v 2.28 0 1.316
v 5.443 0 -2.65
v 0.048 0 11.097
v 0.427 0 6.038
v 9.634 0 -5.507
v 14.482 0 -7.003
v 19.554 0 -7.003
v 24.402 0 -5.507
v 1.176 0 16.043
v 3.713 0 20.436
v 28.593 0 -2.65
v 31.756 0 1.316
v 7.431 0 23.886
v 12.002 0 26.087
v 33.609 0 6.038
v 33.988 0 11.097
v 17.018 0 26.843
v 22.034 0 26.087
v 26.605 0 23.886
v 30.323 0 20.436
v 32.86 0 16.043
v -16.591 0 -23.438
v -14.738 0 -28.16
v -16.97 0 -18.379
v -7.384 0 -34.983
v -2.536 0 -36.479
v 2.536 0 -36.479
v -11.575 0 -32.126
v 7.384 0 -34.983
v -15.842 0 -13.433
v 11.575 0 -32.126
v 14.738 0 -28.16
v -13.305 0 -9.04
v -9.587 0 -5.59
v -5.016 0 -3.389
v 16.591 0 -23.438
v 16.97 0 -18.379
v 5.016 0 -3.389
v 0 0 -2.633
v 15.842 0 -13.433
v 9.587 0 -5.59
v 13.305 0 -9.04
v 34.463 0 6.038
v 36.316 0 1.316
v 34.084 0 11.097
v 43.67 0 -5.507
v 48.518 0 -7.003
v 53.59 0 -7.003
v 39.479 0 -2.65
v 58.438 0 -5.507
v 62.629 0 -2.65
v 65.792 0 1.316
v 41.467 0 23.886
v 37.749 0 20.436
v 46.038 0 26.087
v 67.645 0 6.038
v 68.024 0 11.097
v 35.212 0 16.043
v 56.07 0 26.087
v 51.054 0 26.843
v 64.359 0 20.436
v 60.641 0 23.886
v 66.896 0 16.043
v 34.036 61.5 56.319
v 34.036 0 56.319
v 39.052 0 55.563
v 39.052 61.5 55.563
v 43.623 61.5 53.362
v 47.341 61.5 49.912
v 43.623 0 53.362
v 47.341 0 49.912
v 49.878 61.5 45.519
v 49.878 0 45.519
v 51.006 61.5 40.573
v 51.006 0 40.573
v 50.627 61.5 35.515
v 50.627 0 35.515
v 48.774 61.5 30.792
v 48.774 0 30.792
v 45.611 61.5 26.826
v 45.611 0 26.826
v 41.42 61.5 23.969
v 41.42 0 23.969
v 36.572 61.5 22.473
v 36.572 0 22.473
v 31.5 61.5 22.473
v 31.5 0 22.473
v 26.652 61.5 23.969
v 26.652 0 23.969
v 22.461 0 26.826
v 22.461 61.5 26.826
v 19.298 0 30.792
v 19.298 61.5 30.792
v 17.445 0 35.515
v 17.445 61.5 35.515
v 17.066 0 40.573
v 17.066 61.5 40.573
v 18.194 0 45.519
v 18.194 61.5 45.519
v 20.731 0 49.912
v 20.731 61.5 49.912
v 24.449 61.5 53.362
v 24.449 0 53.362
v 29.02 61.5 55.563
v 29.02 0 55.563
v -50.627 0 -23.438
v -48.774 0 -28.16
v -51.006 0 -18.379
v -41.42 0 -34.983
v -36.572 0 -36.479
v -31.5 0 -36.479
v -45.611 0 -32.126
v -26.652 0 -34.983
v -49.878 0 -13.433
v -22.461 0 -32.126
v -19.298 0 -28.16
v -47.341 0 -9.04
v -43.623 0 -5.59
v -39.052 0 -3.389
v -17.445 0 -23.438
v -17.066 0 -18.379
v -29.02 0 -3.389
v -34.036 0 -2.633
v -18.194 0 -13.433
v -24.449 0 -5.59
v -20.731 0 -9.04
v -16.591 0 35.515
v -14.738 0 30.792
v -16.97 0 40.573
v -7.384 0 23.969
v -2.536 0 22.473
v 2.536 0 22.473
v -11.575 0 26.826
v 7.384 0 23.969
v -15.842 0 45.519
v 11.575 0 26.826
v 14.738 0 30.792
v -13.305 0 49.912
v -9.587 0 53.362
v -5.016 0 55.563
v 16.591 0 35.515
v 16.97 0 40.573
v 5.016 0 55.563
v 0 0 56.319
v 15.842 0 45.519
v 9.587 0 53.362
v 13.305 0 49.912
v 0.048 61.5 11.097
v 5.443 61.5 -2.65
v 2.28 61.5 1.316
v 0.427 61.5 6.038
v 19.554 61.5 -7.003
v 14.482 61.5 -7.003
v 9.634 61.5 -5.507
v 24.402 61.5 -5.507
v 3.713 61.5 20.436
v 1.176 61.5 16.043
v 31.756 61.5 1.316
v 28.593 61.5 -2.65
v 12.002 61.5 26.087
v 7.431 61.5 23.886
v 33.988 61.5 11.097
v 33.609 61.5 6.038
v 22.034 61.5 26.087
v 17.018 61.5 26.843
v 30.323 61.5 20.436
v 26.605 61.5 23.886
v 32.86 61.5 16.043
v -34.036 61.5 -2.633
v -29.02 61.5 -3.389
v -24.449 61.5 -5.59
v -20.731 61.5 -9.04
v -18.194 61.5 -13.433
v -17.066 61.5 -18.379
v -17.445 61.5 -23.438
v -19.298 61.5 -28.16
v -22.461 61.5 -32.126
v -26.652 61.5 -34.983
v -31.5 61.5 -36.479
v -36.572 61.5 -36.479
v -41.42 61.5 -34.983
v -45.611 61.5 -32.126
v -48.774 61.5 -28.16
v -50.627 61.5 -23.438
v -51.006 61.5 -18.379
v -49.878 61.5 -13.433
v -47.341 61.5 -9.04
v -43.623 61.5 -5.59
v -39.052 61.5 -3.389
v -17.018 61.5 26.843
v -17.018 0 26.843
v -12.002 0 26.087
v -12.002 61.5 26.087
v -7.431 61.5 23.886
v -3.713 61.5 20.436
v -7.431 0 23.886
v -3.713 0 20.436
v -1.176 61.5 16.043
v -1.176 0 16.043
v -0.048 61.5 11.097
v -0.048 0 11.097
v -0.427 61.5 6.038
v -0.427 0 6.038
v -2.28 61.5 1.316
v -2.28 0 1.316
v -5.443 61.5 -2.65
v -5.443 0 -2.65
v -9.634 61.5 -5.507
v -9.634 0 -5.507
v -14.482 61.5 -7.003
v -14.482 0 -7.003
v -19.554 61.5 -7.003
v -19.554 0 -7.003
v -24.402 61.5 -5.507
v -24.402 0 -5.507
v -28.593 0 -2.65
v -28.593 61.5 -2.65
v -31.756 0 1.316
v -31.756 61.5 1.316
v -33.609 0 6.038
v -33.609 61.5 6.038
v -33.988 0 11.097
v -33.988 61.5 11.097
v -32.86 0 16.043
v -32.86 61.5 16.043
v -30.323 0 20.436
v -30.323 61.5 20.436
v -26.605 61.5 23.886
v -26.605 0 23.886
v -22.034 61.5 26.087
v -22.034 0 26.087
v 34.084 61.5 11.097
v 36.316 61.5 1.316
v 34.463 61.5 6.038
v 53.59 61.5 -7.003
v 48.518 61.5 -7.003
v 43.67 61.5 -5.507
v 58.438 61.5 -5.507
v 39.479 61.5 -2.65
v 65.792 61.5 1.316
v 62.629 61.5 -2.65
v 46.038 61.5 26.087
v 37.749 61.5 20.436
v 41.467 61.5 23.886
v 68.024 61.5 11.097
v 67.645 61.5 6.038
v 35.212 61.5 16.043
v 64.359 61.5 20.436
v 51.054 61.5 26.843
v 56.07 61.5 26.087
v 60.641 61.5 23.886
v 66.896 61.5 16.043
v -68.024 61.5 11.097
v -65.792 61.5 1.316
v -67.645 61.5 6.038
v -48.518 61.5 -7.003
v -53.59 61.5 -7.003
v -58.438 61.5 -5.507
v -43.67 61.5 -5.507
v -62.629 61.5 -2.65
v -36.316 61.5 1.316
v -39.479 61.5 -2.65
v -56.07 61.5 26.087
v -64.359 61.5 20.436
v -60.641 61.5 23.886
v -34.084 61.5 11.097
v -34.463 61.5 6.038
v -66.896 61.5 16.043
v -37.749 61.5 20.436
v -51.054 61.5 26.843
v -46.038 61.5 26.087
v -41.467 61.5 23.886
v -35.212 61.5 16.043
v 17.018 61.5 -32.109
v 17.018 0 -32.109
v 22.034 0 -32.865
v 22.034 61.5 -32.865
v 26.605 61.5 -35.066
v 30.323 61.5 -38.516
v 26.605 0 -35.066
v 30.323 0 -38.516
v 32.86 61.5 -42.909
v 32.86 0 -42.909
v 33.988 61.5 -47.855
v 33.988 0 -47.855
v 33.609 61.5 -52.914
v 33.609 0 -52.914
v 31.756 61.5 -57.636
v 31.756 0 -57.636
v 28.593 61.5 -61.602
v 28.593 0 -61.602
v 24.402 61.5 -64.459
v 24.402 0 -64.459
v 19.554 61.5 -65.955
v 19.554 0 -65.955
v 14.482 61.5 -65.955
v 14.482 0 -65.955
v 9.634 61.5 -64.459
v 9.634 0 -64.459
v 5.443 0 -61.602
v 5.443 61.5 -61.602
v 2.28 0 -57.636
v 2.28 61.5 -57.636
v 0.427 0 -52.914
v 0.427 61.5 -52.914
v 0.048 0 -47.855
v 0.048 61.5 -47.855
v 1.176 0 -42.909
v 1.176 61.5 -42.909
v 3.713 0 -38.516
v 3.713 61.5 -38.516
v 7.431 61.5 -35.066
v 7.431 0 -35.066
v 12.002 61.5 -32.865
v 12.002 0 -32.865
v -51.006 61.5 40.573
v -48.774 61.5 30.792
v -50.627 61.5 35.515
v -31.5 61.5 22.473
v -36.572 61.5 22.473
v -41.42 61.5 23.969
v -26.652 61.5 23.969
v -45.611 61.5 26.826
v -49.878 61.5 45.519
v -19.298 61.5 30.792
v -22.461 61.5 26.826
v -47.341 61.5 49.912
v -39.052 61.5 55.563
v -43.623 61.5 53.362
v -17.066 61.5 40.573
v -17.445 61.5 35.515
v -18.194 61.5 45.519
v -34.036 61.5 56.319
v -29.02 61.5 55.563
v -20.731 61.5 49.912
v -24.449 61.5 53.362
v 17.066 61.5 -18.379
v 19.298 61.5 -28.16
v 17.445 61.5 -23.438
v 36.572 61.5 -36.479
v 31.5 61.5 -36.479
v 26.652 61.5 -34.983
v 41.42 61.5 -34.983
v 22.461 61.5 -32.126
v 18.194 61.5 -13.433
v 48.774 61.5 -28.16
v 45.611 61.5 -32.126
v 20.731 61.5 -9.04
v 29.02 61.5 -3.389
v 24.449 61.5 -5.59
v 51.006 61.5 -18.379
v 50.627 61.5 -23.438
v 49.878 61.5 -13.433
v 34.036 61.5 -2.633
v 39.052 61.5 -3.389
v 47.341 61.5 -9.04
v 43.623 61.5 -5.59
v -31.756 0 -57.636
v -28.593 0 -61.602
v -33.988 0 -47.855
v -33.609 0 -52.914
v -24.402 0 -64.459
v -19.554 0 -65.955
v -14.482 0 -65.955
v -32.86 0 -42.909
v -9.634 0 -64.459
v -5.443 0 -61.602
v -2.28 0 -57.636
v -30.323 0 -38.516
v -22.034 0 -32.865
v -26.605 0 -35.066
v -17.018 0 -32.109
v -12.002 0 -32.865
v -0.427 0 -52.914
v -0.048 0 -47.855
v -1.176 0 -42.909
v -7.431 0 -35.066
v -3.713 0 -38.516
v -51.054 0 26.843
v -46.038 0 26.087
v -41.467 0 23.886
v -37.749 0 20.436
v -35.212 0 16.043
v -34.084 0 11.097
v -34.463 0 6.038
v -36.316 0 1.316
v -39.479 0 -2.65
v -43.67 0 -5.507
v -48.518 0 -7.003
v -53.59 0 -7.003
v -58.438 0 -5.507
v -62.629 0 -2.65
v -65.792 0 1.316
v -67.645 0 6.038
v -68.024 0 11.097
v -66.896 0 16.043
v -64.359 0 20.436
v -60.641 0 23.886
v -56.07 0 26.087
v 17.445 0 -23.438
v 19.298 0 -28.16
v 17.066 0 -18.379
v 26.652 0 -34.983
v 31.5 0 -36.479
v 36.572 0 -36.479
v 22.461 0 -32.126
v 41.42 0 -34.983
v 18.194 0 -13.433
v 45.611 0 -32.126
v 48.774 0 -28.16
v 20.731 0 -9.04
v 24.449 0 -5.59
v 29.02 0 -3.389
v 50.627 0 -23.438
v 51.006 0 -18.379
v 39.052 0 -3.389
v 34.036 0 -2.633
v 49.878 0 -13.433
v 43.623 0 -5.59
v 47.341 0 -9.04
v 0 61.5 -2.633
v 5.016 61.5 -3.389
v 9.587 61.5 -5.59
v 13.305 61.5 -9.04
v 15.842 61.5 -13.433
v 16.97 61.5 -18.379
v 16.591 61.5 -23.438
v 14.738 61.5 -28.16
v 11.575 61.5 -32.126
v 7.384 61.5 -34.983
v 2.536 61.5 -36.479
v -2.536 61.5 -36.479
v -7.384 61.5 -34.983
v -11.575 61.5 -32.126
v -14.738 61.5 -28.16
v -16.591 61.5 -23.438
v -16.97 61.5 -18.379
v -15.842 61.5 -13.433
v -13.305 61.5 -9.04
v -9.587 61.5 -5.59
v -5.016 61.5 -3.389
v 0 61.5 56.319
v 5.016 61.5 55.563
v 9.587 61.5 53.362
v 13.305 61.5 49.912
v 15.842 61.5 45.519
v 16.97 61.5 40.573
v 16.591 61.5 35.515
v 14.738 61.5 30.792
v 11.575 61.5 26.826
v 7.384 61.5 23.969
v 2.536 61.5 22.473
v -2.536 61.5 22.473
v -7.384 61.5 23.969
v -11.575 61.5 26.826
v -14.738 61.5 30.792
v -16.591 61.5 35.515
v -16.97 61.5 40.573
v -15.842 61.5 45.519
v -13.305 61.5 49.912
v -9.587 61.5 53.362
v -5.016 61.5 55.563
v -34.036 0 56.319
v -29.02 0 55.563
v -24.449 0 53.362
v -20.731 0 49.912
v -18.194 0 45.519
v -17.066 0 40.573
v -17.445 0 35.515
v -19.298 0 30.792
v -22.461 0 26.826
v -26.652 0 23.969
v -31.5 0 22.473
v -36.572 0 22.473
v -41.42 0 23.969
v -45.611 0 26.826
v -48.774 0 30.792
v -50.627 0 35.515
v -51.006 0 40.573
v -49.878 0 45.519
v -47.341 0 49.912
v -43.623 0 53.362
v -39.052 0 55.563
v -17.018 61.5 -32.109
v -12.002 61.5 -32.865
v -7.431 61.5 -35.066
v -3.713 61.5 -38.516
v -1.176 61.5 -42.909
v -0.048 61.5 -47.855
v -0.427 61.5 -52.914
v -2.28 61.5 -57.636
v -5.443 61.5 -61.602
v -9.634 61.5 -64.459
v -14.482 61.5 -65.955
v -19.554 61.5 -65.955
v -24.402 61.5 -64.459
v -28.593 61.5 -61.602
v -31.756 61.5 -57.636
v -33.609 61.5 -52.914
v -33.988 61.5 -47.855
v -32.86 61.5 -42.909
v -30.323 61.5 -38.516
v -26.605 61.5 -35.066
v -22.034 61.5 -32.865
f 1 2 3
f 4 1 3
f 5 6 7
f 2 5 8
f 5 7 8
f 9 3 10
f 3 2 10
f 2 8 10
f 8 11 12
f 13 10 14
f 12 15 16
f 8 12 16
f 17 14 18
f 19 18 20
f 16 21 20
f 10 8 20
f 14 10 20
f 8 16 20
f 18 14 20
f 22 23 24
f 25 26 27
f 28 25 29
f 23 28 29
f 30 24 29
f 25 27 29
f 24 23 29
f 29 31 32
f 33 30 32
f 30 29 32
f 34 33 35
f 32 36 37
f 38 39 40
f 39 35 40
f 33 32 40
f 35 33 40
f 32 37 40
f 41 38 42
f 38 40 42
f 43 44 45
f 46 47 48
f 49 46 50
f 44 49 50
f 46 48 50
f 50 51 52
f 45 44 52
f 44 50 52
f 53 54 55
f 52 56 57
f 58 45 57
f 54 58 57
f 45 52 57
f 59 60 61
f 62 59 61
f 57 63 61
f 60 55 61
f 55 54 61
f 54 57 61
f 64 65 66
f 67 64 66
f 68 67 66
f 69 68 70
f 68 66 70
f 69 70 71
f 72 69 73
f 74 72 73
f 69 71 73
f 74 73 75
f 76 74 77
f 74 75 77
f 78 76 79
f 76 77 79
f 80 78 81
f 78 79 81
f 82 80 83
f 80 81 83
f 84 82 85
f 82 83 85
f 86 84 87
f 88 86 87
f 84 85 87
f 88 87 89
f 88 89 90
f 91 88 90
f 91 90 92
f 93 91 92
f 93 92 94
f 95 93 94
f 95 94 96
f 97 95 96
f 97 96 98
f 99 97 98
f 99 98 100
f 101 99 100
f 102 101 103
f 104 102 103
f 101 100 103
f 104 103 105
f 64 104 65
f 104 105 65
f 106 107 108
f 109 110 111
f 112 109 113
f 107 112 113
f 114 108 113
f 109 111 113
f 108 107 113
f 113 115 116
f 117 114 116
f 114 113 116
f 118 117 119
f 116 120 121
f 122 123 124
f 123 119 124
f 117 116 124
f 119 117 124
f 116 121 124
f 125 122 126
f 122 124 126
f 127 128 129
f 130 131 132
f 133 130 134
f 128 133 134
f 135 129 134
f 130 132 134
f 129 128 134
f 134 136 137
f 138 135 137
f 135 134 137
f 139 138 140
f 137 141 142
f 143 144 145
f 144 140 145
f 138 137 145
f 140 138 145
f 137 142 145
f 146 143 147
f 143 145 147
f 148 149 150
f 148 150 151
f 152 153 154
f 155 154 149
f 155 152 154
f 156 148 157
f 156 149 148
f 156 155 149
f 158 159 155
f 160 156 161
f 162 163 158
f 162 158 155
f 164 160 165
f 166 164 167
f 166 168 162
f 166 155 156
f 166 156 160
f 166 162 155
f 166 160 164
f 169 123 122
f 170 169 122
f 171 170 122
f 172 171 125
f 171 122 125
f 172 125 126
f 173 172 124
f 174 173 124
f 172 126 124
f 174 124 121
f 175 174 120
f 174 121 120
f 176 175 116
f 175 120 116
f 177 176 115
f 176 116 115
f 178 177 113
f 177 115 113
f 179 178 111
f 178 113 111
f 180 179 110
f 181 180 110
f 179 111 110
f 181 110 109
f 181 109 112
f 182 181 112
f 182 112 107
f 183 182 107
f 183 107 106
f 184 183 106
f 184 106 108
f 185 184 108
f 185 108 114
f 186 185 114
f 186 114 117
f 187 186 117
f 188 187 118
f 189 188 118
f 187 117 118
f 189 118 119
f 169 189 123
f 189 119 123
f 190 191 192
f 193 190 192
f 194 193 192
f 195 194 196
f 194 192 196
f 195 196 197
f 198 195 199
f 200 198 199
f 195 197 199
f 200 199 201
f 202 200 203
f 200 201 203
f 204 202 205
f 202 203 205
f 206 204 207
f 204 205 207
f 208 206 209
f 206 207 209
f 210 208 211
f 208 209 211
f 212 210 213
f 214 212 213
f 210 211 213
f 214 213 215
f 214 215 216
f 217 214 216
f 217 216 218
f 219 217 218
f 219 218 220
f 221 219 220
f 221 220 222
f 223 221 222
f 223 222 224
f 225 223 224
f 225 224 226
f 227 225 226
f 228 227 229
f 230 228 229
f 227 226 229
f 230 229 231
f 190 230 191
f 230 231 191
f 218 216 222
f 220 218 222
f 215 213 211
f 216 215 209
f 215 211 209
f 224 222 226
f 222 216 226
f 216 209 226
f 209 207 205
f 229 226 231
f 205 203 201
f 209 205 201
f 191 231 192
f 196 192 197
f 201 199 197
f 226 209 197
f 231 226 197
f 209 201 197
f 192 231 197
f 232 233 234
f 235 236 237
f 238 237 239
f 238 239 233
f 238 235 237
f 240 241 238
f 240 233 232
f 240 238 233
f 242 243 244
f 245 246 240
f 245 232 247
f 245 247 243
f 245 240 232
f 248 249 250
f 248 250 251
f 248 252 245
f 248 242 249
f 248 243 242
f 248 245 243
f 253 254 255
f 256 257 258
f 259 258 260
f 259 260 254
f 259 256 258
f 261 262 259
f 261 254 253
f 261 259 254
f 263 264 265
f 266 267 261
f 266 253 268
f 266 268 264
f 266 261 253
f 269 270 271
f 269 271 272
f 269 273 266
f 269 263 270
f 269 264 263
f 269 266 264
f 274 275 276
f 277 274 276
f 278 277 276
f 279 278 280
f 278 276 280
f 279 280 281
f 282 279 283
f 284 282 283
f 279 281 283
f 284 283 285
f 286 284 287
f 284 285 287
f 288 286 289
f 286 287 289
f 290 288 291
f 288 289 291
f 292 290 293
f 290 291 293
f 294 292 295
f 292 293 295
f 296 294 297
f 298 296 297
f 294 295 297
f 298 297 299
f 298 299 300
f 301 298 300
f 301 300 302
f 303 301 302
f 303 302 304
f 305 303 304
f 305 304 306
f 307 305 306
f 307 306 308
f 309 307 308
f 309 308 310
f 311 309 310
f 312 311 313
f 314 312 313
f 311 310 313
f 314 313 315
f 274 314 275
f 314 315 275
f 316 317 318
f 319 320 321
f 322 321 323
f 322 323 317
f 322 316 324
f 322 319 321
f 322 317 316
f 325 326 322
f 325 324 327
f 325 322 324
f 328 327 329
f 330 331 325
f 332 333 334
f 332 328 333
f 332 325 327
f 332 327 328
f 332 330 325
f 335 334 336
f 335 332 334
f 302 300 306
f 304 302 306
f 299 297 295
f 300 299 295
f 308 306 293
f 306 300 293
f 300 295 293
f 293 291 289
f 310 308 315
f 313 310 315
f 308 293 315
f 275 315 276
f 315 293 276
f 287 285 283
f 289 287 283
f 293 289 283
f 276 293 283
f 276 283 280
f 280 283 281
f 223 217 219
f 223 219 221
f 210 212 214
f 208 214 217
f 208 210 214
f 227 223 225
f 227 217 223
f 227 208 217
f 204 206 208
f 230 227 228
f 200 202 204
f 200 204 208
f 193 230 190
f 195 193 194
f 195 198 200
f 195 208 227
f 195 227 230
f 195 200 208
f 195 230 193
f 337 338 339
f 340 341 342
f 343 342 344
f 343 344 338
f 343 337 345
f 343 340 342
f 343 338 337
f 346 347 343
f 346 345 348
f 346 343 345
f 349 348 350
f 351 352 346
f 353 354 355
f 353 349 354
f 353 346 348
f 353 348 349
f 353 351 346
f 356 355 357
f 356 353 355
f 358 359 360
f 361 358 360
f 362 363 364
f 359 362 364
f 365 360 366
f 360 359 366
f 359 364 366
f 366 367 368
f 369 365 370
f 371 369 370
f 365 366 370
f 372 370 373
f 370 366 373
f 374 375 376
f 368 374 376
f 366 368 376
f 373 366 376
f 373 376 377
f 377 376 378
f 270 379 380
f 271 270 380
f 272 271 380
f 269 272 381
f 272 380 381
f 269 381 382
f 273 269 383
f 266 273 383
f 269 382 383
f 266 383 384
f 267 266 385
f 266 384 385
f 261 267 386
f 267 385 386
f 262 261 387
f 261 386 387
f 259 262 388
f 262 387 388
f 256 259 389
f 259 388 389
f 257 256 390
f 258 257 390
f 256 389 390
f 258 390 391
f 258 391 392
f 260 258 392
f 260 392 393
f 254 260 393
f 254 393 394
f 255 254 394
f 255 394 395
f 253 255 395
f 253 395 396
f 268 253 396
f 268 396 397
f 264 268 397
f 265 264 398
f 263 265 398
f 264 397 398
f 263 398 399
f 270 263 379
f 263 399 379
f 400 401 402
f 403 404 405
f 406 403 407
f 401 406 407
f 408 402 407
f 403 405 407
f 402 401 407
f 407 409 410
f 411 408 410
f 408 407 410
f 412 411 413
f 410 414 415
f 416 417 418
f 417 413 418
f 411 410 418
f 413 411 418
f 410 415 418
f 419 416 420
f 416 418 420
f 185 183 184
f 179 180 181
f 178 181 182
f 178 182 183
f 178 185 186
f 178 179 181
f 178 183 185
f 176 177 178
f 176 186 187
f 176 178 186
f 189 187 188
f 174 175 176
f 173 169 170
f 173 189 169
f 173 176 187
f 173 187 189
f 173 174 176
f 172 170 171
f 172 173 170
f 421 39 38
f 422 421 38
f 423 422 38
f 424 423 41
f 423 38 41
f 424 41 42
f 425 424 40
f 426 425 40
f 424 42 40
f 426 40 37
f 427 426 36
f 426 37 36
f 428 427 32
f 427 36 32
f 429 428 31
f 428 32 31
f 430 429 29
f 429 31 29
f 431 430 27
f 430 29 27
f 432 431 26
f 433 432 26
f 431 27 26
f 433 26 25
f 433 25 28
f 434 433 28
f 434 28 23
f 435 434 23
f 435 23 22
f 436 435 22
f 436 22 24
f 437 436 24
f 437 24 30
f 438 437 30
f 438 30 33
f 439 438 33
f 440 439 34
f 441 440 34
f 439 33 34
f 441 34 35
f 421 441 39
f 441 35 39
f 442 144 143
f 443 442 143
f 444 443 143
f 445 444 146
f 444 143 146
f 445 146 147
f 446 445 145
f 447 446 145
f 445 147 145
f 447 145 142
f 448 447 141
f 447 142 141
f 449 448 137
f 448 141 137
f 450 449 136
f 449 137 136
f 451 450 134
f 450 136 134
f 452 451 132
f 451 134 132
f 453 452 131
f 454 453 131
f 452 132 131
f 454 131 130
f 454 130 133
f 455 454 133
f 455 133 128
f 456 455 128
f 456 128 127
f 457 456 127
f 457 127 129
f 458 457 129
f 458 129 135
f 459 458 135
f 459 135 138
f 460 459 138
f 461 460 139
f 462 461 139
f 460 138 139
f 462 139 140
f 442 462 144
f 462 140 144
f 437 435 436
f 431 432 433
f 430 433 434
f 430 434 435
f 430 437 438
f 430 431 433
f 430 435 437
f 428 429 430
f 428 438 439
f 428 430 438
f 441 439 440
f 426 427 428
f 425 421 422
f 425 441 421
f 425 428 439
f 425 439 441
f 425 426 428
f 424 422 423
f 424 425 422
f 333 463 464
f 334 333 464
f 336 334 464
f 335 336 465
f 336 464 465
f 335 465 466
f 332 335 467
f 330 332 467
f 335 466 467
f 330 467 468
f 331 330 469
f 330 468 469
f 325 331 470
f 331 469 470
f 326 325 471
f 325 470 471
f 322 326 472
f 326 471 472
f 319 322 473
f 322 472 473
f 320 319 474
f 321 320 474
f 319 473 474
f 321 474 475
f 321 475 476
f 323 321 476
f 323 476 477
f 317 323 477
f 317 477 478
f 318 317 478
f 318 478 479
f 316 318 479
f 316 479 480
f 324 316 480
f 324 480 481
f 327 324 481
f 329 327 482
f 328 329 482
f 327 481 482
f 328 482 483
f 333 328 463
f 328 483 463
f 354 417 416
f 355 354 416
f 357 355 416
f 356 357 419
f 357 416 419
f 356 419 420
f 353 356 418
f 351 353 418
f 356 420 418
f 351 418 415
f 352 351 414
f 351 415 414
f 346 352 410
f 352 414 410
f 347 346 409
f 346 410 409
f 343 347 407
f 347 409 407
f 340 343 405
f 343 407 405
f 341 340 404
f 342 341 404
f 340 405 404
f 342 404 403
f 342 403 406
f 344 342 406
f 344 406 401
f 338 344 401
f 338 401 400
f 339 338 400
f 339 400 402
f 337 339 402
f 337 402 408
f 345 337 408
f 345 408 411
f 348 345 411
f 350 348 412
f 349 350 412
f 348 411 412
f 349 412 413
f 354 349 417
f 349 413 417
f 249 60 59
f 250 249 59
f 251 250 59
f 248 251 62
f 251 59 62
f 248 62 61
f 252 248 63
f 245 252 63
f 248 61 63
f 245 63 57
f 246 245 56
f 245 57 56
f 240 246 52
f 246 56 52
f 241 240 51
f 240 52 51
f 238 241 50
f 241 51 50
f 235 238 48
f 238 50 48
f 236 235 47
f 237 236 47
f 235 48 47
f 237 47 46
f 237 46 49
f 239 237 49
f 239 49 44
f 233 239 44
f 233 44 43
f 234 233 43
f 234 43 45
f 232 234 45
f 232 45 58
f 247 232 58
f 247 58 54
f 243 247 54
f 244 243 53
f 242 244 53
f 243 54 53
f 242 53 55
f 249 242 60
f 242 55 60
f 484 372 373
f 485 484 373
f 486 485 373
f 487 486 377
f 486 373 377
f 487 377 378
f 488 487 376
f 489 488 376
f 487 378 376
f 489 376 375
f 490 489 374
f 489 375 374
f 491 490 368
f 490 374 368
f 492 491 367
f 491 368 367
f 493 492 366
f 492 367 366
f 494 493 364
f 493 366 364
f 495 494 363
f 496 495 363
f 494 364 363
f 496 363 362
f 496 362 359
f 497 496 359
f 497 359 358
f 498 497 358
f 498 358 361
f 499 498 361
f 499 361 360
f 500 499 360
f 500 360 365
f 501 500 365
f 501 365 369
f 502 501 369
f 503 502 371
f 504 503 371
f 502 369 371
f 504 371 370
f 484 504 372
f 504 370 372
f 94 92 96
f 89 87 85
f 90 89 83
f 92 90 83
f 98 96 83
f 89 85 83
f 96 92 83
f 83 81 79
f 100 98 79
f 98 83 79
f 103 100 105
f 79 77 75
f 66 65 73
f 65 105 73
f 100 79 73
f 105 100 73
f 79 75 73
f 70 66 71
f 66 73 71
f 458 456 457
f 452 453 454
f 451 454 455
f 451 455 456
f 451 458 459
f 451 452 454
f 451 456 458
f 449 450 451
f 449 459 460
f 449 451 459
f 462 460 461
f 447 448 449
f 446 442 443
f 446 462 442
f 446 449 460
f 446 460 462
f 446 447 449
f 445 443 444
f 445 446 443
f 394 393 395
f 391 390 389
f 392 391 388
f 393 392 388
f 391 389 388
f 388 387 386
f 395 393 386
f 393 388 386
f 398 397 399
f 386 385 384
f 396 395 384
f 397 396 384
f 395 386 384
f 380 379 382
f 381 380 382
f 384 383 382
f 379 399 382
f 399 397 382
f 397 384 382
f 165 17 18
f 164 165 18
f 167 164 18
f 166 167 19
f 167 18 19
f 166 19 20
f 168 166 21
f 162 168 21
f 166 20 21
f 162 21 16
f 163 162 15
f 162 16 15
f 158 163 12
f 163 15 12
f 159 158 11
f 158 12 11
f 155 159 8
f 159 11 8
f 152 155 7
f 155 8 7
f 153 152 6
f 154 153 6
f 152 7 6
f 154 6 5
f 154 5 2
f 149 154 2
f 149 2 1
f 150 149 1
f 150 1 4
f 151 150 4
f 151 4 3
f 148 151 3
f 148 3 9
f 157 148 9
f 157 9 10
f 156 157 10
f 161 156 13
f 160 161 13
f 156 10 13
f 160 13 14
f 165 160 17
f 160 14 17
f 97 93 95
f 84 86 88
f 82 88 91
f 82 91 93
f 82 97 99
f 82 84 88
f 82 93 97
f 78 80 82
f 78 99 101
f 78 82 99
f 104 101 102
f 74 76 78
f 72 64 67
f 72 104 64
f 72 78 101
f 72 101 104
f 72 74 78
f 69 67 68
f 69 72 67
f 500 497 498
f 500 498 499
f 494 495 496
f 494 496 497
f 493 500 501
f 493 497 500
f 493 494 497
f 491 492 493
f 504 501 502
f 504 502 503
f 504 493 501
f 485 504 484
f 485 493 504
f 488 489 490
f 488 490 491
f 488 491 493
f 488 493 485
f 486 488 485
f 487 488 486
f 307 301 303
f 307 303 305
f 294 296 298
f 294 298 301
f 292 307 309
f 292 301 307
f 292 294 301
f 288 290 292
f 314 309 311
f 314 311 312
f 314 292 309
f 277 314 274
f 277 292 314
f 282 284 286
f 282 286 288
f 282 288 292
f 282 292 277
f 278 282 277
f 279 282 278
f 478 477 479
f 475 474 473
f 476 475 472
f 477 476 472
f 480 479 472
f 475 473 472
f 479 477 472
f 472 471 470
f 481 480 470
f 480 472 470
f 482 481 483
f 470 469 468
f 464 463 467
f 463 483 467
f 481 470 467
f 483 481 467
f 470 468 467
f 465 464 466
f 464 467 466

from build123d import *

# Parameters (mm, degrees)
SKETCH1_R              = 17.018
BOSS_EXTRUDE1_DEPTH    = 61.5
BOSS_EXTRUDE1_2_DEPTH  = 61.5
BOSS_EXTRUDE1_3_DEPTH  = 61.5
BOSS_EXTRUDE1_4_DEPTH  = 61.5
BOSS_EXTRUDE1_5_DEPTH  = 61.5
BOSS_EXTRUDE1_6_DEPTH  = 61.5
BOSS_EXTRUDE1_7_DEPTH  = 61.5
BOSS_EXTRUDE1_8_DEPTH  = 61.5
BOSS_EXTRUDE1_9_DEPTH  = 61.5
BOSS_EXTRUDE1_10_DEPTH = 61.5
BOSS_EXTRUDE1_11_DEPTH = 61.5
BOSS_EXTRUDE1_12_DEPTH = 61.5


with BuildPart() as part:
    # Sketch1 → Boss-Extrude1 (new body)
    with BuildSketch(Plane(origin=(0, 0, 0), x_dir=(1, 0, 0), z_dir=(0, 1, 0))):
        with Locations(Location((34.036, -39.301387524, 0), (0, 0, 270))):
            Circle(SKETCH1_R)
    extrude(amount=BOSS_EXTRUDE1_DEPTH)


with BuildPart() as body_2:
    # Sketch1 → Boss-Extrude1 2 (new body)
    with BuildSketch(Plane(origin=(0, 0, 0), x_dir=(1, 0, 0), z_dir=(0, 1, 0))):
        with Locations(Location((51.054, -9.825346881, 0), (0, 0, 270))):
            Circle(SKETCH1_R)
    extrude(amount=BOSS_EXTRUDE1_2_DEPTH)


with BuildPart() as body_3:
    # Sketch1 → Boss-Extrude1 3 (new body)
    with BuildSketch(Plane(origin=(0, 0, 0), x_dir=(1, 0, 0), z_dir=(0, 1, 0))):
        with Locations(Location((34.036, 19.650693762, 0), (0, 0, 270))):
            Circle(SKETCH1_R)
    extrude(amount=BOSS_EXTRUDE1_3_DEPTH)


with BuildPart() as body_4:
    # Sketch1 → Boss-Extrude1 4 (new body)
    with BuildSketch(Plane(origin=(0, 0, 0), x_dir=(1, 0, 0), z_dir=(0, 1, 0))):
        with Locations(Location((17.018, 49.126734405, 0), (0, 0, 270))):
            Circle(SKETCH1_R)
    extrude(amount=BOSS_EXTRUDE1_4_DEPTH)


with BuildPart() as body_5:
    # Sketch1 → Boss-Extrude1 5 (new body)
    with BuildSketch(Plane(origin=(0, 0, 0), x_dir=(1, 0, 0), z_dir=(0, 1, 0))):
        with Locations(Location((-17.018, 49.126734405, 0), (0, 0, 270))):
            Circle(SKETCH1_R)
    extrude(amount=BOSS_EXTRUDE1_5_DEPTH)


with BuildPart() as body_6:
    # Sketch1 → Boss-Extrude1 6 (new body)
    with BuildSketch(Plane(origin=(0, 0, 0), x_dir=(1, 0, 0), z_dir=(0, 1, 0))):
        with Locations(Location((-34.036, 19.650693762, 0), (0, 0, 270))):
            Circle(SKETCH1_R)
    extrude(amount=BOSS_EXTRUDE1_6_DEPTH)


with BuildPart() as body_7:
    # Sketch1 → Boss-Extrude1 7 (new body)
    with BuildSketch(Plane(origin=(0, 0, 0), x_dir=(1, 0, 0), z_dir=(0, 1, 0))):
        with Locations(Location((0, 19.650693762, 0), (0, 0, 270))):
            Circle(SKETCH1_R)
    extrude(amount=BOSS_EXTRUDE1_7_DEPTH)


with BuildPart() as body_8:
    # Sketch1 → Boss-Extrude1 8 (new body)
    with BuildSketch(Plane(origin=(0, 0, 0), x_dir=(1, 0, 0), z_dir=(0, 1, 0))):
        with Locations(Location((-17.018, -9.825346881, 0), (0, 0, 270))):
            Circle(SKETCH1_R)
    extrude(amount=BOSS_EXTRUDE1_8_DEPTH)


with BuildPart() as body_9:
    # Sketch1 → Boss-Extrude1 9 (new body)
    with BuildSketch(Plane(origin=(0, 0, 0), x_dir=(1, 0, 0), z_dir=(0, 1, 0))):
        with Locations(Location((-51.054, -9.825346881, 0), (0, 0, 270))):
            Circle(SKETCH1_R)
    extrude(amount=BOSS_EXTRUDE1_9_DEPTH)


with BuildPart() as body_10:
    # Sketch1 → Boss-Extrude1 10 (new body)
    with BuildSketch(Plane(origin=(0, 0, 0), x_dir=(1, 0, 0), z_dir=(0, 1, 0))):
        with Locations(Location((-34.036, -39.301387524, 0), (0, 0, 270))):
            Circle(SKETCH1_R)
    extrude(amount=BOSS_EXTRUDE1_10_DEPTH)


with BuildPart() as body_11:
    # Sketch1 → Boss-Extrude1 11 (new body)
    with BuildSketch(Plane(origin=(0, 0, 0), x_dir=(1, 0, 0), z_dir=(0, 1, 0))):
        with Locations(Location((0, -39.301387524, 0), (0, 0, 270))):
            Circle(SKETCH1_R)
    extrude(amount=BOSS_EXTRUDE1_11_DEPTH)


with BuildPart() as body_12:
    # Sketch1 → Boss-Extrude1 12 (new body)
    with BuildSketch(Plane(origin=(0, 0, 0), x_dir=(1, 0, 0), z_dir=(0, 1, 0))):
        with Locations(Location((17.018, -9.825346881, 0), (0, 0, 270))):
            Circle(SKETCH1_R)
    extrude(amount=BOSS_EXTRUDE1_12_DEPTH)


solid = Compound([part.part, body_2.part, body_3.part, body_4.part, body_5.part, body_6.part, body_7.part, body_8.part, body_9.part, body_10.part, body_11.part, body_12.part])
